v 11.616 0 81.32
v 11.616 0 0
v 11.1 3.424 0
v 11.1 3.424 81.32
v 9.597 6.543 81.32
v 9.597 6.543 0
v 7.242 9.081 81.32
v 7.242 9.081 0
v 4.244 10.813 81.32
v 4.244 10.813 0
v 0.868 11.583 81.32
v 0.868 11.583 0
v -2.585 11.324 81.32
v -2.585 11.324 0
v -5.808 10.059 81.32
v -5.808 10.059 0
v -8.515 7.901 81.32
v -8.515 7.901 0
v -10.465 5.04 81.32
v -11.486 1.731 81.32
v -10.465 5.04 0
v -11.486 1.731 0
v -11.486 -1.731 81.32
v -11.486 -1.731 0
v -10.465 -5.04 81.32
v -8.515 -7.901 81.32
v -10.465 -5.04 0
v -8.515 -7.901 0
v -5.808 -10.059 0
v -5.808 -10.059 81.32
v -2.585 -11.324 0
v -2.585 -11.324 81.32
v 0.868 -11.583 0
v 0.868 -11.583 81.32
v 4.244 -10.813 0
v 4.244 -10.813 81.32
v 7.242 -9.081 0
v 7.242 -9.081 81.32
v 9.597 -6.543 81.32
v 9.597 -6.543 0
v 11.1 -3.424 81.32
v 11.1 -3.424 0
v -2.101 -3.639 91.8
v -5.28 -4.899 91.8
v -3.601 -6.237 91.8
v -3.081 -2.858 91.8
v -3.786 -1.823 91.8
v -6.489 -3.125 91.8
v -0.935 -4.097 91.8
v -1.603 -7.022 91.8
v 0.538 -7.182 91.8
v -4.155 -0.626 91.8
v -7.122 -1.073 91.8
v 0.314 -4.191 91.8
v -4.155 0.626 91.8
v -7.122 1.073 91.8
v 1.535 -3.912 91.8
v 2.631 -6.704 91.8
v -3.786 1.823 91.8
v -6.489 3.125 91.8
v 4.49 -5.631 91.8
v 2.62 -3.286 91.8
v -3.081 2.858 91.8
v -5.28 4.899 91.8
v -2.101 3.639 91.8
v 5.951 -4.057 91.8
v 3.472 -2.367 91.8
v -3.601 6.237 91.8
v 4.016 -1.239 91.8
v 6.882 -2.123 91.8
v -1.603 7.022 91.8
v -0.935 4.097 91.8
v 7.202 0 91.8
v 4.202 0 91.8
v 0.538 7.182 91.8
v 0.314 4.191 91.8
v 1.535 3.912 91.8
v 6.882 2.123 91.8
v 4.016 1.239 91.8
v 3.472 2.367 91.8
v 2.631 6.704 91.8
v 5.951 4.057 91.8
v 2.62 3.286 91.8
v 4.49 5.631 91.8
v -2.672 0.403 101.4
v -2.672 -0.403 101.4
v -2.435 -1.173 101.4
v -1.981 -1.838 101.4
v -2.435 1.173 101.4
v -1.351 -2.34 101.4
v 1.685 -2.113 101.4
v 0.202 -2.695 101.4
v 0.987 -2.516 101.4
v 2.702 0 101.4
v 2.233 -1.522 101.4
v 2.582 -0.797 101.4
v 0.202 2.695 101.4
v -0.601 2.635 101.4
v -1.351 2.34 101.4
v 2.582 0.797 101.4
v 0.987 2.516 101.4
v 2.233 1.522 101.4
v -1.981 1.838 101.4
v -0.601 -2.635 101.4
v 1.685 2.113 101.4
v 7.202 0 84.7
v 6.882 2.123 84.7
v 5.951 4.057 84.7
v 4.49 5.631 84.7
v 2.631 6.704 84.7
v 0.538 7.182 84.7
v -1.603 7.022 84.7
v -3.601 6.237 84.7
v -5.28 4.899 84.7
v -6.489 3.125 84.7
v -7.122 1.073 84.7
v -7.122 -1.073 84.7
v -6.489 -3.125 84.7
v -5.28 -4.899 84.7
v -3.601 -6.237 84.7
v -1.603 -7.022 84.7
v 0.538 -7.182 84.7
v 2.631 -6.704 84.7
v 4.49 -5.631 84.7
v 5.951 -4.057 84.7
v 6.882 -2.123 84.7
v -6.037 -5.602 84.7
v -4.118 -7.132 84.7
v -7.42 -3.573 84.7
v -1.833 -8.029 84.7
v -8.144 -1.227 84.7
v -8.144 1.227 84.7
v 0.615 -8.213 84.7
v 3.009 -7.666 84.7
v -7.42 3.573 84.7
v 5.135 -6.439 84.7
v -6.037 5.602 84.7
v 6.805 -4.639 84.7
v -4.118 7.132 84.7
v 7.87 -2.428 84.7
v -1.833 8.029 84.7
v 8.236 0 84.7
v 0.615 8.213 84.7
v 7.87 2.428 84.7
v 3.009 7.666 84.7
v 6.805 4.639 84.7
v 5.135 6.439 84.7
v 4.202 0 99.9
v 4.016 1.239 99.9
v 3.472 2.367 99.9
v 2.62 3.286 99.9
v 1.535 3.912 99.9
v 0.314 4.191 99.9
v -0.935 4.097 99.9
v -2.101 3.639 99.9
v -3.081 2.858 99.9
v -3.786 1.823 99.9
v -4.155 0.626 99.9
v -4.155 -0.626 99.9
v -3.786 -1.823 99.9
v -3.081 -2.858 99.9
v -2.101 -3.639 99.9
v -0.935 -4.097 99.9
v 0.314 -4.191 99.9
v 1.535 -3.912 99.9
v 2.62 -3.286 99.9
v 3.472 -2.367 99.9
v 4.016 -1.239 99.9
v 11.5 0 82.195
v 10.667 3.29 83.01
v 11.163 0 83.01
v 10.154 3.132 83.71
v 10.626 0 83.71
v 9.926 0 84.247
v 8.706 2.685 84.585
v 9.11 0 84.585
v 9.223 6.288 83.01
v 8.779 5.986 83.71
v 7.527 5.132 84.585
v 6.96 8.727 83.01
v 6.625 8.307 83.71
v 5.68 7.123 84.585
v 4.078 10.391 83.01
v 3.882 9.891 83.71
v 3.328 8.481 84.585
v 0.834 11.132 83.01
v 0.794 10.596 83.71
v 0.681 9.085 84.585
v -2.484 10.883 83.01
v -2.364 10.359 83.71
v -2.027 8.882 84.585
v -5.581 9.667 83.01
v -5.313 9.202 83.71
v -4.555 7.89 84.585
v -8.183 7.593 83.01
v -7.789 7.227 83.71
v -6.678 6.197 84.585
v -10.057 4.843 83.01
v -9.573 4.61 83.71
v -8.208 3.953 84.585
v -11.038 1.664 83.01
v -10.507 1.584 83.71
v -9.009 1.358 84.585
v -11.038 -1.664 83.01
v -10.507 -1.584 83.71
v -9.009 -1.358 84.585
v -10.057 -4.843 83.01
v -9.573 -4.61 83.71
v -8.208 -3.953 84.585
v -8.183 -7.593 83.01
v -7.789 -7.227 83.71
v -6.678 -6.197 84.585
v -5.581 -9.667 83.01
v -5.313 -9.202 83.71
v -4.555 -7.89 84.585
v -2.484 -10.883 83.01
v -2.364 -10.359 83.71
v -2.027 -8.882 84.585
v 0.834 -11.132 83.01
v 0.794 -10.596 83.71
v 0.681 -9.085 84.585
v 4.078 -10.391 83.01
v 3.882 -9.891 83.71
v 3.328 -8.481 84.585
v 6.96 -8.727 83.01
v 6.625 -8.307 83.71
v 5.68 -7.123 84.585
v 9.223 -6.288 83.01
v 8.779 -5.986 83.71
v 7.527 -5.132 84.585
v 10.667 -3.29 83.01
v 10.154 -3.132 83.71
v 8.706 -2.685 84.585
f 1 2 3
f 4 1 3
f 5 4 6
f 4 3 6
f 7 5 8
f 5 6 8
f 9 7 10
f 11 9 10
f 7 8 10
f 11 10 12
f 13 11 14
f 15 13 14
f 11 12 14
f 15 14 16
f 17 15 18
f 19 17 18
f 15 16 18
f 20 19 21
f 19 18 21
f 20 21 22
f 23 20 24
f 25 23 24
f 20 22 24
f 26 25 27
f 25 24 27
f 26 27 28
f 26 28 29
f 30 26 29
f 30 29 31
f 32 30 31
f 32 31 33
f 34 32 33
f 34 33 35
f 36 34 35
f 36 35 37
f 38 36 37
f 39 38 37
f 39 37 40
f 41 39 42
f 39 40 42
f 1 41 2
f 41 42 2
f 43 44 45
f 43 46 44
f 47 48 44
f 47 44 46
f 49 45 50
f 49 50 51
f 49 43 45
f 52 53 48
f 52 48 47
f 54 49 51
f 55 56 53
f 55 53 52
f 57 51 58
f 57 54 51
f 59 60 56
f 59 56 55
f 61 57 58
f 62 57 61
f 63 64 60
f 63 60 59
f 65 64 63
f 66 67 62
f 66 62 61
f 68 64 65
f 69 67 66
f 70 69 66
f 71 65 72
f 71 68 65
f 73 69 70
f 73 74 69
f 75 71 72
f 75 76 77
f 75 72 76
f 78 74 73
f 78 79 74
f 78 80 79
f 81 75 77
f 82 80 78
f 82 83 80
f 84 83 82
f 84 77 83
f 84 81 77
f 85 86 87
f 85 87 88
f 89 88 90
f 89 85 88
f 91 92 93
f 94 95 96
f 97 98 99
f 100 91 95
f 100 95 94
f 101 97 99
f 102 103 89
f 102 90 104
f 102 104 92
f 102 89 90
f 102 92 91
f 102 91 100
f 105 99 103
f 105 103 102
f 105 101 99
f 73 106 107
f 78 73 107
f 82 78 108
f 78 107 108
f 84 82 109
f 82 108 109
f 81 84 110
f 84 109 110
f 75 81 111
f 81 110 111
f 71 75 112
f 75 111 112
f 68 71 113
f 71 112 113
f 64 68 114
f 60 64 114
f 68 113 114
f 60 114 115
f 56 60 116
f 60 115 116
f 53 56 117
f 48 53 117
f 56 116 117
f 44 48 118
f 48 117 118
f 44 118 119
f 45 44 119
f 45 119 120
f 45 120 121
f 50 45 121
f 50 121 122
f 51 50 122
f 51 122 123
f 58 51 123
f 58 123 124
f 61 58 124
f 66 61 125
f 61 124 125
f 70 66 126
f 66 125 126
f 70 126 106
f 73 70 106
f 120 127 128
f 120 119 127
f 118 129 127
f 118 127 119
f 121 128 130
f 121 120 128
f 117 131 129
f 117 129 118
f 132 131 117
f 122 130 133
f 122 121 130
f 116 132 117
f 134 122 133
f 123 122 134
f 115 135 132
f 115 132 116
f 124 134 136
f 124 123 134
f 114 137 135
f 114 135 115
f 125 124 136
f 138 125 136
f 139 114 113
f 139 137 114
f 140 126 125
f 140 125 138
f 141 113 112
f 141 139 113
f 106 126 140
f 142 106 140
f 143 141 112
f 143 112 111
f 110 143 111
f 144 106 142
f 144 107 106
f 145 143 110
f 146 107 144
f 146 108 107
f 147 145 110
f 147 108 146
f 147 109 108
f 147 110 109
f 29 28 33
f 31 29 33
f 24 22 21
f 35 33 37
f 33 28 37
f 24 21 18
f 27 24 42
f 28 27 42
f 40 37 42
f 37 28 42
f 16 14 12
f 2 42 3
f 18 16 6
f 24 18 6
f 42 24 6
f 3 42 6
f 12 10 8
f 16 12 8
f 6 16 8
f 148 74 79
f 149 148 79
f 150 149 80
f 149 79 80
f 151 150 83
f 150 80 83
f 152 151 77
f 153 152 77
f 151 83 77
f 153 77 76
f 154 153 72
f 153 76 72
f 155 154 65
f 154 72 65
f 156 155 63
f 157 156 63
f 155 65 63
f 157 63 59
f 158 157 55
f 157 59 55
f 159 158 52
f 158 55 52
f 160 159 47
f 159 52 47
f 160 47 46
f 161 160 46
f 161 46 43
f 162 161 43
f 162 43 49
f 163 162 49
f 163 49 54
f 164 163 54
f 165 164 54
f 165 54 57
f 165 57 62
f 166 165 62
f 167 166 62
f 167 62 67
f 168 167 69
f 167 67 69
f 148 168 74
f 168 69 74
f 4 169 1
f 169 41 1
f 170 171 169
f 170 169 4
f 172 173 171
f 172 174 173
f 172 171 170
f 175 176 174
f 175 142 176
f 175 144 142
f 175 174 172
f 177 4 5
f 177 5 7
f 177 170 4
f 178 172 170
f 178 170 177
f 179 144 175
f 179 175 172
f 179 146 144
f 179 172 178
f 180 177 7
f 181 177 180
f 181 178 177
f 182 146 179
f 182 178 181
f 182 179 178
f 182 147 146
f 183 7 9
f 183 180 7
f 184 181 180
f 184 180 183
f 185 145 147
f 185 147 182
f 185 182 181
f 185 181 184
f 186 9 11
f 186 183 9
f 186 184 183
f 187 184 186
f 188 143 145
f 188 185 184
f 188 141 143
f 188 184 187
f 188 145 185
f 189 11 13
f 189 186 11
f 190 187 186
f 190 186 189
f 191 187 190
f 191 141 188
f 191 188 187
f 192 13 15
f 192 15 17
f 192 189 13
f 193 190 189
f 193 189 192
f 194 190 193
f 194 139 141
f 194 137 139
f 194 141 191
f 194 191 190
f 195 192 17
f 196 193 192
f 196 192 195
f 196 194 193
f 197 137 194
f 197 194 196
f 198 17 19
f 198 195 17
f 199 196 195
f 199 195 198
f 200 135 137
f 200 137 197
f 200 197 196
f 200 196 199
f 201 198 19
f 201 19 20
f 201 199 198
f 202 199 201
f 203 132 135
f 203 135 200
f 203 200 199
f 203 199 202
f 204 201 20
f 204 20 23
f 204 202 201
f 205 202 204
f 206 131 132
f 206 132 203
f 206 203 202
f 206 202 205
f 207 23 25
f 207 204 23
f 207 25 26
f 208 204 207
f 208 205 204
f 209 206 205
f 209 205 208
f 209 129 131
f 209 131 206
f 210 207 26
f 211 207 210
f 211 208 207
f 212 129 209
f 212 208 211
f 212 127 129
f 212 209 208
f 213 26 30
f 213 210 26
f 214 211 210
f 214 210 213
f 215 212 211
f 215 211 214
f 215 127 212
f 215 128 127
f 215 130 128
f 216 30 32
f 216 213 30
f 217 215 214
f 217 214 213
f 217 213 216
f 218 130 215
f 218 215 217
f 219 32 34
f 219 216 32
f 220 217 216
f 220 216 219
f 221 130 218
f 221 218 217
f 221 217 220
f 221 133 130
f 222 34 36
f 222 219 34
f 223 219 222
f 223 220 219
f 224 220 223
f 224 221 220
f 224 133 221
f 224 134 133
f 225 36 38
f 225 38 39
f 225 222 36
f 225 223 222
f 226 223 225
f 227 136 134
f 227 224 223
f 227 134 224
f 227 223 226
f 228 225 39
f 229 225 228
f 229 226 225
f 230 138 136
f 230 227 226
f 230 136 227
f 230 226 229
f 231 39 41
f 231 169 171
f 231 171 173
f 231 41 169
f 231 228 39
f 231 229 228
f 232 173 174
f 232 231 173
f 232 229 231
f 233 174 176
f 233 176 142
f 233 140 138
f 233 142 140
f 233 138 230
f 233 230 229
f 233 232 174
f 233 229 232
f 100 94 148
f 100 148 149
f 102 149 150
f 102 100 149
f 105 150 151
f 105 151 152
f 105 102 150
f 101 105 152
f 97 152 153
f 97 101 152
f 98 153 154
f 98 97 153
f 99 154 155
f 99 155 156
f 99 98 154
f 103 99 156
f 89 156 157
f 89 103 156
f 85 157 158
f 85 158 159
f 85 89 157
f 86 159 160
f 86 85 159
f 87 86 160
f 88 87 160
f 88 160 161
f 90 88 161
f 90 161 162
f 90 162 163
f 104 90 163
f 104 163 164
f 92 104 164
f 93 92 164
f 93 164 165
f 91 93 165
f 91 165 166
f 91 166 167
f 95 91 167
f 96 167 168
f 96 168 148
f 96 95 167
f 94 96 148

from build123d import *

# Parameters (mm, degrees)
F0_R     = 11.615552
F1_DEPTH = 84.7
F2_R     = 7.202174
F3_DEPTH = 7.1
F4_R     = 4.202422
F5_DEPTH = 9.6
F6_R     = 3.379899
F7_SIZE  = 1.5


with BuildPart() as f1:
    # F0 (on Top) → F1 (new body)
    with BuildSketch(Plane.XY):
        Circle(F0_R)
    extrude(amount=F1_DEPTH)

    # F2 (on face) → F3 (join)
    with BuildSketch(Plane.XY.offset(84.7)):
        Circle(F2_R)
    extrude(amount=F3_DEPTH)

    # F4 (on face) → F5 (join)
    with BuildSketch(Plane.XY.offset(91.8)):
        Circle(F4_R)
    extrude(amount=F5_DEPTH)

    # F6
    f6_edges = [f1.edges().sort_by_distance(p)[0] for p in [
        (-11.615552, 0, 84.7),
    ]]
    fillet(f6_edges, radius=F6_R)

    # F7
    f7_edges = [f1.edges().sort_by_distance(p)[0] for p in [
        (-4.202422, 0, 101.4),
    ]]
    chamfer(f7_edges, length=F7_SIZE)


solid = f1.part
